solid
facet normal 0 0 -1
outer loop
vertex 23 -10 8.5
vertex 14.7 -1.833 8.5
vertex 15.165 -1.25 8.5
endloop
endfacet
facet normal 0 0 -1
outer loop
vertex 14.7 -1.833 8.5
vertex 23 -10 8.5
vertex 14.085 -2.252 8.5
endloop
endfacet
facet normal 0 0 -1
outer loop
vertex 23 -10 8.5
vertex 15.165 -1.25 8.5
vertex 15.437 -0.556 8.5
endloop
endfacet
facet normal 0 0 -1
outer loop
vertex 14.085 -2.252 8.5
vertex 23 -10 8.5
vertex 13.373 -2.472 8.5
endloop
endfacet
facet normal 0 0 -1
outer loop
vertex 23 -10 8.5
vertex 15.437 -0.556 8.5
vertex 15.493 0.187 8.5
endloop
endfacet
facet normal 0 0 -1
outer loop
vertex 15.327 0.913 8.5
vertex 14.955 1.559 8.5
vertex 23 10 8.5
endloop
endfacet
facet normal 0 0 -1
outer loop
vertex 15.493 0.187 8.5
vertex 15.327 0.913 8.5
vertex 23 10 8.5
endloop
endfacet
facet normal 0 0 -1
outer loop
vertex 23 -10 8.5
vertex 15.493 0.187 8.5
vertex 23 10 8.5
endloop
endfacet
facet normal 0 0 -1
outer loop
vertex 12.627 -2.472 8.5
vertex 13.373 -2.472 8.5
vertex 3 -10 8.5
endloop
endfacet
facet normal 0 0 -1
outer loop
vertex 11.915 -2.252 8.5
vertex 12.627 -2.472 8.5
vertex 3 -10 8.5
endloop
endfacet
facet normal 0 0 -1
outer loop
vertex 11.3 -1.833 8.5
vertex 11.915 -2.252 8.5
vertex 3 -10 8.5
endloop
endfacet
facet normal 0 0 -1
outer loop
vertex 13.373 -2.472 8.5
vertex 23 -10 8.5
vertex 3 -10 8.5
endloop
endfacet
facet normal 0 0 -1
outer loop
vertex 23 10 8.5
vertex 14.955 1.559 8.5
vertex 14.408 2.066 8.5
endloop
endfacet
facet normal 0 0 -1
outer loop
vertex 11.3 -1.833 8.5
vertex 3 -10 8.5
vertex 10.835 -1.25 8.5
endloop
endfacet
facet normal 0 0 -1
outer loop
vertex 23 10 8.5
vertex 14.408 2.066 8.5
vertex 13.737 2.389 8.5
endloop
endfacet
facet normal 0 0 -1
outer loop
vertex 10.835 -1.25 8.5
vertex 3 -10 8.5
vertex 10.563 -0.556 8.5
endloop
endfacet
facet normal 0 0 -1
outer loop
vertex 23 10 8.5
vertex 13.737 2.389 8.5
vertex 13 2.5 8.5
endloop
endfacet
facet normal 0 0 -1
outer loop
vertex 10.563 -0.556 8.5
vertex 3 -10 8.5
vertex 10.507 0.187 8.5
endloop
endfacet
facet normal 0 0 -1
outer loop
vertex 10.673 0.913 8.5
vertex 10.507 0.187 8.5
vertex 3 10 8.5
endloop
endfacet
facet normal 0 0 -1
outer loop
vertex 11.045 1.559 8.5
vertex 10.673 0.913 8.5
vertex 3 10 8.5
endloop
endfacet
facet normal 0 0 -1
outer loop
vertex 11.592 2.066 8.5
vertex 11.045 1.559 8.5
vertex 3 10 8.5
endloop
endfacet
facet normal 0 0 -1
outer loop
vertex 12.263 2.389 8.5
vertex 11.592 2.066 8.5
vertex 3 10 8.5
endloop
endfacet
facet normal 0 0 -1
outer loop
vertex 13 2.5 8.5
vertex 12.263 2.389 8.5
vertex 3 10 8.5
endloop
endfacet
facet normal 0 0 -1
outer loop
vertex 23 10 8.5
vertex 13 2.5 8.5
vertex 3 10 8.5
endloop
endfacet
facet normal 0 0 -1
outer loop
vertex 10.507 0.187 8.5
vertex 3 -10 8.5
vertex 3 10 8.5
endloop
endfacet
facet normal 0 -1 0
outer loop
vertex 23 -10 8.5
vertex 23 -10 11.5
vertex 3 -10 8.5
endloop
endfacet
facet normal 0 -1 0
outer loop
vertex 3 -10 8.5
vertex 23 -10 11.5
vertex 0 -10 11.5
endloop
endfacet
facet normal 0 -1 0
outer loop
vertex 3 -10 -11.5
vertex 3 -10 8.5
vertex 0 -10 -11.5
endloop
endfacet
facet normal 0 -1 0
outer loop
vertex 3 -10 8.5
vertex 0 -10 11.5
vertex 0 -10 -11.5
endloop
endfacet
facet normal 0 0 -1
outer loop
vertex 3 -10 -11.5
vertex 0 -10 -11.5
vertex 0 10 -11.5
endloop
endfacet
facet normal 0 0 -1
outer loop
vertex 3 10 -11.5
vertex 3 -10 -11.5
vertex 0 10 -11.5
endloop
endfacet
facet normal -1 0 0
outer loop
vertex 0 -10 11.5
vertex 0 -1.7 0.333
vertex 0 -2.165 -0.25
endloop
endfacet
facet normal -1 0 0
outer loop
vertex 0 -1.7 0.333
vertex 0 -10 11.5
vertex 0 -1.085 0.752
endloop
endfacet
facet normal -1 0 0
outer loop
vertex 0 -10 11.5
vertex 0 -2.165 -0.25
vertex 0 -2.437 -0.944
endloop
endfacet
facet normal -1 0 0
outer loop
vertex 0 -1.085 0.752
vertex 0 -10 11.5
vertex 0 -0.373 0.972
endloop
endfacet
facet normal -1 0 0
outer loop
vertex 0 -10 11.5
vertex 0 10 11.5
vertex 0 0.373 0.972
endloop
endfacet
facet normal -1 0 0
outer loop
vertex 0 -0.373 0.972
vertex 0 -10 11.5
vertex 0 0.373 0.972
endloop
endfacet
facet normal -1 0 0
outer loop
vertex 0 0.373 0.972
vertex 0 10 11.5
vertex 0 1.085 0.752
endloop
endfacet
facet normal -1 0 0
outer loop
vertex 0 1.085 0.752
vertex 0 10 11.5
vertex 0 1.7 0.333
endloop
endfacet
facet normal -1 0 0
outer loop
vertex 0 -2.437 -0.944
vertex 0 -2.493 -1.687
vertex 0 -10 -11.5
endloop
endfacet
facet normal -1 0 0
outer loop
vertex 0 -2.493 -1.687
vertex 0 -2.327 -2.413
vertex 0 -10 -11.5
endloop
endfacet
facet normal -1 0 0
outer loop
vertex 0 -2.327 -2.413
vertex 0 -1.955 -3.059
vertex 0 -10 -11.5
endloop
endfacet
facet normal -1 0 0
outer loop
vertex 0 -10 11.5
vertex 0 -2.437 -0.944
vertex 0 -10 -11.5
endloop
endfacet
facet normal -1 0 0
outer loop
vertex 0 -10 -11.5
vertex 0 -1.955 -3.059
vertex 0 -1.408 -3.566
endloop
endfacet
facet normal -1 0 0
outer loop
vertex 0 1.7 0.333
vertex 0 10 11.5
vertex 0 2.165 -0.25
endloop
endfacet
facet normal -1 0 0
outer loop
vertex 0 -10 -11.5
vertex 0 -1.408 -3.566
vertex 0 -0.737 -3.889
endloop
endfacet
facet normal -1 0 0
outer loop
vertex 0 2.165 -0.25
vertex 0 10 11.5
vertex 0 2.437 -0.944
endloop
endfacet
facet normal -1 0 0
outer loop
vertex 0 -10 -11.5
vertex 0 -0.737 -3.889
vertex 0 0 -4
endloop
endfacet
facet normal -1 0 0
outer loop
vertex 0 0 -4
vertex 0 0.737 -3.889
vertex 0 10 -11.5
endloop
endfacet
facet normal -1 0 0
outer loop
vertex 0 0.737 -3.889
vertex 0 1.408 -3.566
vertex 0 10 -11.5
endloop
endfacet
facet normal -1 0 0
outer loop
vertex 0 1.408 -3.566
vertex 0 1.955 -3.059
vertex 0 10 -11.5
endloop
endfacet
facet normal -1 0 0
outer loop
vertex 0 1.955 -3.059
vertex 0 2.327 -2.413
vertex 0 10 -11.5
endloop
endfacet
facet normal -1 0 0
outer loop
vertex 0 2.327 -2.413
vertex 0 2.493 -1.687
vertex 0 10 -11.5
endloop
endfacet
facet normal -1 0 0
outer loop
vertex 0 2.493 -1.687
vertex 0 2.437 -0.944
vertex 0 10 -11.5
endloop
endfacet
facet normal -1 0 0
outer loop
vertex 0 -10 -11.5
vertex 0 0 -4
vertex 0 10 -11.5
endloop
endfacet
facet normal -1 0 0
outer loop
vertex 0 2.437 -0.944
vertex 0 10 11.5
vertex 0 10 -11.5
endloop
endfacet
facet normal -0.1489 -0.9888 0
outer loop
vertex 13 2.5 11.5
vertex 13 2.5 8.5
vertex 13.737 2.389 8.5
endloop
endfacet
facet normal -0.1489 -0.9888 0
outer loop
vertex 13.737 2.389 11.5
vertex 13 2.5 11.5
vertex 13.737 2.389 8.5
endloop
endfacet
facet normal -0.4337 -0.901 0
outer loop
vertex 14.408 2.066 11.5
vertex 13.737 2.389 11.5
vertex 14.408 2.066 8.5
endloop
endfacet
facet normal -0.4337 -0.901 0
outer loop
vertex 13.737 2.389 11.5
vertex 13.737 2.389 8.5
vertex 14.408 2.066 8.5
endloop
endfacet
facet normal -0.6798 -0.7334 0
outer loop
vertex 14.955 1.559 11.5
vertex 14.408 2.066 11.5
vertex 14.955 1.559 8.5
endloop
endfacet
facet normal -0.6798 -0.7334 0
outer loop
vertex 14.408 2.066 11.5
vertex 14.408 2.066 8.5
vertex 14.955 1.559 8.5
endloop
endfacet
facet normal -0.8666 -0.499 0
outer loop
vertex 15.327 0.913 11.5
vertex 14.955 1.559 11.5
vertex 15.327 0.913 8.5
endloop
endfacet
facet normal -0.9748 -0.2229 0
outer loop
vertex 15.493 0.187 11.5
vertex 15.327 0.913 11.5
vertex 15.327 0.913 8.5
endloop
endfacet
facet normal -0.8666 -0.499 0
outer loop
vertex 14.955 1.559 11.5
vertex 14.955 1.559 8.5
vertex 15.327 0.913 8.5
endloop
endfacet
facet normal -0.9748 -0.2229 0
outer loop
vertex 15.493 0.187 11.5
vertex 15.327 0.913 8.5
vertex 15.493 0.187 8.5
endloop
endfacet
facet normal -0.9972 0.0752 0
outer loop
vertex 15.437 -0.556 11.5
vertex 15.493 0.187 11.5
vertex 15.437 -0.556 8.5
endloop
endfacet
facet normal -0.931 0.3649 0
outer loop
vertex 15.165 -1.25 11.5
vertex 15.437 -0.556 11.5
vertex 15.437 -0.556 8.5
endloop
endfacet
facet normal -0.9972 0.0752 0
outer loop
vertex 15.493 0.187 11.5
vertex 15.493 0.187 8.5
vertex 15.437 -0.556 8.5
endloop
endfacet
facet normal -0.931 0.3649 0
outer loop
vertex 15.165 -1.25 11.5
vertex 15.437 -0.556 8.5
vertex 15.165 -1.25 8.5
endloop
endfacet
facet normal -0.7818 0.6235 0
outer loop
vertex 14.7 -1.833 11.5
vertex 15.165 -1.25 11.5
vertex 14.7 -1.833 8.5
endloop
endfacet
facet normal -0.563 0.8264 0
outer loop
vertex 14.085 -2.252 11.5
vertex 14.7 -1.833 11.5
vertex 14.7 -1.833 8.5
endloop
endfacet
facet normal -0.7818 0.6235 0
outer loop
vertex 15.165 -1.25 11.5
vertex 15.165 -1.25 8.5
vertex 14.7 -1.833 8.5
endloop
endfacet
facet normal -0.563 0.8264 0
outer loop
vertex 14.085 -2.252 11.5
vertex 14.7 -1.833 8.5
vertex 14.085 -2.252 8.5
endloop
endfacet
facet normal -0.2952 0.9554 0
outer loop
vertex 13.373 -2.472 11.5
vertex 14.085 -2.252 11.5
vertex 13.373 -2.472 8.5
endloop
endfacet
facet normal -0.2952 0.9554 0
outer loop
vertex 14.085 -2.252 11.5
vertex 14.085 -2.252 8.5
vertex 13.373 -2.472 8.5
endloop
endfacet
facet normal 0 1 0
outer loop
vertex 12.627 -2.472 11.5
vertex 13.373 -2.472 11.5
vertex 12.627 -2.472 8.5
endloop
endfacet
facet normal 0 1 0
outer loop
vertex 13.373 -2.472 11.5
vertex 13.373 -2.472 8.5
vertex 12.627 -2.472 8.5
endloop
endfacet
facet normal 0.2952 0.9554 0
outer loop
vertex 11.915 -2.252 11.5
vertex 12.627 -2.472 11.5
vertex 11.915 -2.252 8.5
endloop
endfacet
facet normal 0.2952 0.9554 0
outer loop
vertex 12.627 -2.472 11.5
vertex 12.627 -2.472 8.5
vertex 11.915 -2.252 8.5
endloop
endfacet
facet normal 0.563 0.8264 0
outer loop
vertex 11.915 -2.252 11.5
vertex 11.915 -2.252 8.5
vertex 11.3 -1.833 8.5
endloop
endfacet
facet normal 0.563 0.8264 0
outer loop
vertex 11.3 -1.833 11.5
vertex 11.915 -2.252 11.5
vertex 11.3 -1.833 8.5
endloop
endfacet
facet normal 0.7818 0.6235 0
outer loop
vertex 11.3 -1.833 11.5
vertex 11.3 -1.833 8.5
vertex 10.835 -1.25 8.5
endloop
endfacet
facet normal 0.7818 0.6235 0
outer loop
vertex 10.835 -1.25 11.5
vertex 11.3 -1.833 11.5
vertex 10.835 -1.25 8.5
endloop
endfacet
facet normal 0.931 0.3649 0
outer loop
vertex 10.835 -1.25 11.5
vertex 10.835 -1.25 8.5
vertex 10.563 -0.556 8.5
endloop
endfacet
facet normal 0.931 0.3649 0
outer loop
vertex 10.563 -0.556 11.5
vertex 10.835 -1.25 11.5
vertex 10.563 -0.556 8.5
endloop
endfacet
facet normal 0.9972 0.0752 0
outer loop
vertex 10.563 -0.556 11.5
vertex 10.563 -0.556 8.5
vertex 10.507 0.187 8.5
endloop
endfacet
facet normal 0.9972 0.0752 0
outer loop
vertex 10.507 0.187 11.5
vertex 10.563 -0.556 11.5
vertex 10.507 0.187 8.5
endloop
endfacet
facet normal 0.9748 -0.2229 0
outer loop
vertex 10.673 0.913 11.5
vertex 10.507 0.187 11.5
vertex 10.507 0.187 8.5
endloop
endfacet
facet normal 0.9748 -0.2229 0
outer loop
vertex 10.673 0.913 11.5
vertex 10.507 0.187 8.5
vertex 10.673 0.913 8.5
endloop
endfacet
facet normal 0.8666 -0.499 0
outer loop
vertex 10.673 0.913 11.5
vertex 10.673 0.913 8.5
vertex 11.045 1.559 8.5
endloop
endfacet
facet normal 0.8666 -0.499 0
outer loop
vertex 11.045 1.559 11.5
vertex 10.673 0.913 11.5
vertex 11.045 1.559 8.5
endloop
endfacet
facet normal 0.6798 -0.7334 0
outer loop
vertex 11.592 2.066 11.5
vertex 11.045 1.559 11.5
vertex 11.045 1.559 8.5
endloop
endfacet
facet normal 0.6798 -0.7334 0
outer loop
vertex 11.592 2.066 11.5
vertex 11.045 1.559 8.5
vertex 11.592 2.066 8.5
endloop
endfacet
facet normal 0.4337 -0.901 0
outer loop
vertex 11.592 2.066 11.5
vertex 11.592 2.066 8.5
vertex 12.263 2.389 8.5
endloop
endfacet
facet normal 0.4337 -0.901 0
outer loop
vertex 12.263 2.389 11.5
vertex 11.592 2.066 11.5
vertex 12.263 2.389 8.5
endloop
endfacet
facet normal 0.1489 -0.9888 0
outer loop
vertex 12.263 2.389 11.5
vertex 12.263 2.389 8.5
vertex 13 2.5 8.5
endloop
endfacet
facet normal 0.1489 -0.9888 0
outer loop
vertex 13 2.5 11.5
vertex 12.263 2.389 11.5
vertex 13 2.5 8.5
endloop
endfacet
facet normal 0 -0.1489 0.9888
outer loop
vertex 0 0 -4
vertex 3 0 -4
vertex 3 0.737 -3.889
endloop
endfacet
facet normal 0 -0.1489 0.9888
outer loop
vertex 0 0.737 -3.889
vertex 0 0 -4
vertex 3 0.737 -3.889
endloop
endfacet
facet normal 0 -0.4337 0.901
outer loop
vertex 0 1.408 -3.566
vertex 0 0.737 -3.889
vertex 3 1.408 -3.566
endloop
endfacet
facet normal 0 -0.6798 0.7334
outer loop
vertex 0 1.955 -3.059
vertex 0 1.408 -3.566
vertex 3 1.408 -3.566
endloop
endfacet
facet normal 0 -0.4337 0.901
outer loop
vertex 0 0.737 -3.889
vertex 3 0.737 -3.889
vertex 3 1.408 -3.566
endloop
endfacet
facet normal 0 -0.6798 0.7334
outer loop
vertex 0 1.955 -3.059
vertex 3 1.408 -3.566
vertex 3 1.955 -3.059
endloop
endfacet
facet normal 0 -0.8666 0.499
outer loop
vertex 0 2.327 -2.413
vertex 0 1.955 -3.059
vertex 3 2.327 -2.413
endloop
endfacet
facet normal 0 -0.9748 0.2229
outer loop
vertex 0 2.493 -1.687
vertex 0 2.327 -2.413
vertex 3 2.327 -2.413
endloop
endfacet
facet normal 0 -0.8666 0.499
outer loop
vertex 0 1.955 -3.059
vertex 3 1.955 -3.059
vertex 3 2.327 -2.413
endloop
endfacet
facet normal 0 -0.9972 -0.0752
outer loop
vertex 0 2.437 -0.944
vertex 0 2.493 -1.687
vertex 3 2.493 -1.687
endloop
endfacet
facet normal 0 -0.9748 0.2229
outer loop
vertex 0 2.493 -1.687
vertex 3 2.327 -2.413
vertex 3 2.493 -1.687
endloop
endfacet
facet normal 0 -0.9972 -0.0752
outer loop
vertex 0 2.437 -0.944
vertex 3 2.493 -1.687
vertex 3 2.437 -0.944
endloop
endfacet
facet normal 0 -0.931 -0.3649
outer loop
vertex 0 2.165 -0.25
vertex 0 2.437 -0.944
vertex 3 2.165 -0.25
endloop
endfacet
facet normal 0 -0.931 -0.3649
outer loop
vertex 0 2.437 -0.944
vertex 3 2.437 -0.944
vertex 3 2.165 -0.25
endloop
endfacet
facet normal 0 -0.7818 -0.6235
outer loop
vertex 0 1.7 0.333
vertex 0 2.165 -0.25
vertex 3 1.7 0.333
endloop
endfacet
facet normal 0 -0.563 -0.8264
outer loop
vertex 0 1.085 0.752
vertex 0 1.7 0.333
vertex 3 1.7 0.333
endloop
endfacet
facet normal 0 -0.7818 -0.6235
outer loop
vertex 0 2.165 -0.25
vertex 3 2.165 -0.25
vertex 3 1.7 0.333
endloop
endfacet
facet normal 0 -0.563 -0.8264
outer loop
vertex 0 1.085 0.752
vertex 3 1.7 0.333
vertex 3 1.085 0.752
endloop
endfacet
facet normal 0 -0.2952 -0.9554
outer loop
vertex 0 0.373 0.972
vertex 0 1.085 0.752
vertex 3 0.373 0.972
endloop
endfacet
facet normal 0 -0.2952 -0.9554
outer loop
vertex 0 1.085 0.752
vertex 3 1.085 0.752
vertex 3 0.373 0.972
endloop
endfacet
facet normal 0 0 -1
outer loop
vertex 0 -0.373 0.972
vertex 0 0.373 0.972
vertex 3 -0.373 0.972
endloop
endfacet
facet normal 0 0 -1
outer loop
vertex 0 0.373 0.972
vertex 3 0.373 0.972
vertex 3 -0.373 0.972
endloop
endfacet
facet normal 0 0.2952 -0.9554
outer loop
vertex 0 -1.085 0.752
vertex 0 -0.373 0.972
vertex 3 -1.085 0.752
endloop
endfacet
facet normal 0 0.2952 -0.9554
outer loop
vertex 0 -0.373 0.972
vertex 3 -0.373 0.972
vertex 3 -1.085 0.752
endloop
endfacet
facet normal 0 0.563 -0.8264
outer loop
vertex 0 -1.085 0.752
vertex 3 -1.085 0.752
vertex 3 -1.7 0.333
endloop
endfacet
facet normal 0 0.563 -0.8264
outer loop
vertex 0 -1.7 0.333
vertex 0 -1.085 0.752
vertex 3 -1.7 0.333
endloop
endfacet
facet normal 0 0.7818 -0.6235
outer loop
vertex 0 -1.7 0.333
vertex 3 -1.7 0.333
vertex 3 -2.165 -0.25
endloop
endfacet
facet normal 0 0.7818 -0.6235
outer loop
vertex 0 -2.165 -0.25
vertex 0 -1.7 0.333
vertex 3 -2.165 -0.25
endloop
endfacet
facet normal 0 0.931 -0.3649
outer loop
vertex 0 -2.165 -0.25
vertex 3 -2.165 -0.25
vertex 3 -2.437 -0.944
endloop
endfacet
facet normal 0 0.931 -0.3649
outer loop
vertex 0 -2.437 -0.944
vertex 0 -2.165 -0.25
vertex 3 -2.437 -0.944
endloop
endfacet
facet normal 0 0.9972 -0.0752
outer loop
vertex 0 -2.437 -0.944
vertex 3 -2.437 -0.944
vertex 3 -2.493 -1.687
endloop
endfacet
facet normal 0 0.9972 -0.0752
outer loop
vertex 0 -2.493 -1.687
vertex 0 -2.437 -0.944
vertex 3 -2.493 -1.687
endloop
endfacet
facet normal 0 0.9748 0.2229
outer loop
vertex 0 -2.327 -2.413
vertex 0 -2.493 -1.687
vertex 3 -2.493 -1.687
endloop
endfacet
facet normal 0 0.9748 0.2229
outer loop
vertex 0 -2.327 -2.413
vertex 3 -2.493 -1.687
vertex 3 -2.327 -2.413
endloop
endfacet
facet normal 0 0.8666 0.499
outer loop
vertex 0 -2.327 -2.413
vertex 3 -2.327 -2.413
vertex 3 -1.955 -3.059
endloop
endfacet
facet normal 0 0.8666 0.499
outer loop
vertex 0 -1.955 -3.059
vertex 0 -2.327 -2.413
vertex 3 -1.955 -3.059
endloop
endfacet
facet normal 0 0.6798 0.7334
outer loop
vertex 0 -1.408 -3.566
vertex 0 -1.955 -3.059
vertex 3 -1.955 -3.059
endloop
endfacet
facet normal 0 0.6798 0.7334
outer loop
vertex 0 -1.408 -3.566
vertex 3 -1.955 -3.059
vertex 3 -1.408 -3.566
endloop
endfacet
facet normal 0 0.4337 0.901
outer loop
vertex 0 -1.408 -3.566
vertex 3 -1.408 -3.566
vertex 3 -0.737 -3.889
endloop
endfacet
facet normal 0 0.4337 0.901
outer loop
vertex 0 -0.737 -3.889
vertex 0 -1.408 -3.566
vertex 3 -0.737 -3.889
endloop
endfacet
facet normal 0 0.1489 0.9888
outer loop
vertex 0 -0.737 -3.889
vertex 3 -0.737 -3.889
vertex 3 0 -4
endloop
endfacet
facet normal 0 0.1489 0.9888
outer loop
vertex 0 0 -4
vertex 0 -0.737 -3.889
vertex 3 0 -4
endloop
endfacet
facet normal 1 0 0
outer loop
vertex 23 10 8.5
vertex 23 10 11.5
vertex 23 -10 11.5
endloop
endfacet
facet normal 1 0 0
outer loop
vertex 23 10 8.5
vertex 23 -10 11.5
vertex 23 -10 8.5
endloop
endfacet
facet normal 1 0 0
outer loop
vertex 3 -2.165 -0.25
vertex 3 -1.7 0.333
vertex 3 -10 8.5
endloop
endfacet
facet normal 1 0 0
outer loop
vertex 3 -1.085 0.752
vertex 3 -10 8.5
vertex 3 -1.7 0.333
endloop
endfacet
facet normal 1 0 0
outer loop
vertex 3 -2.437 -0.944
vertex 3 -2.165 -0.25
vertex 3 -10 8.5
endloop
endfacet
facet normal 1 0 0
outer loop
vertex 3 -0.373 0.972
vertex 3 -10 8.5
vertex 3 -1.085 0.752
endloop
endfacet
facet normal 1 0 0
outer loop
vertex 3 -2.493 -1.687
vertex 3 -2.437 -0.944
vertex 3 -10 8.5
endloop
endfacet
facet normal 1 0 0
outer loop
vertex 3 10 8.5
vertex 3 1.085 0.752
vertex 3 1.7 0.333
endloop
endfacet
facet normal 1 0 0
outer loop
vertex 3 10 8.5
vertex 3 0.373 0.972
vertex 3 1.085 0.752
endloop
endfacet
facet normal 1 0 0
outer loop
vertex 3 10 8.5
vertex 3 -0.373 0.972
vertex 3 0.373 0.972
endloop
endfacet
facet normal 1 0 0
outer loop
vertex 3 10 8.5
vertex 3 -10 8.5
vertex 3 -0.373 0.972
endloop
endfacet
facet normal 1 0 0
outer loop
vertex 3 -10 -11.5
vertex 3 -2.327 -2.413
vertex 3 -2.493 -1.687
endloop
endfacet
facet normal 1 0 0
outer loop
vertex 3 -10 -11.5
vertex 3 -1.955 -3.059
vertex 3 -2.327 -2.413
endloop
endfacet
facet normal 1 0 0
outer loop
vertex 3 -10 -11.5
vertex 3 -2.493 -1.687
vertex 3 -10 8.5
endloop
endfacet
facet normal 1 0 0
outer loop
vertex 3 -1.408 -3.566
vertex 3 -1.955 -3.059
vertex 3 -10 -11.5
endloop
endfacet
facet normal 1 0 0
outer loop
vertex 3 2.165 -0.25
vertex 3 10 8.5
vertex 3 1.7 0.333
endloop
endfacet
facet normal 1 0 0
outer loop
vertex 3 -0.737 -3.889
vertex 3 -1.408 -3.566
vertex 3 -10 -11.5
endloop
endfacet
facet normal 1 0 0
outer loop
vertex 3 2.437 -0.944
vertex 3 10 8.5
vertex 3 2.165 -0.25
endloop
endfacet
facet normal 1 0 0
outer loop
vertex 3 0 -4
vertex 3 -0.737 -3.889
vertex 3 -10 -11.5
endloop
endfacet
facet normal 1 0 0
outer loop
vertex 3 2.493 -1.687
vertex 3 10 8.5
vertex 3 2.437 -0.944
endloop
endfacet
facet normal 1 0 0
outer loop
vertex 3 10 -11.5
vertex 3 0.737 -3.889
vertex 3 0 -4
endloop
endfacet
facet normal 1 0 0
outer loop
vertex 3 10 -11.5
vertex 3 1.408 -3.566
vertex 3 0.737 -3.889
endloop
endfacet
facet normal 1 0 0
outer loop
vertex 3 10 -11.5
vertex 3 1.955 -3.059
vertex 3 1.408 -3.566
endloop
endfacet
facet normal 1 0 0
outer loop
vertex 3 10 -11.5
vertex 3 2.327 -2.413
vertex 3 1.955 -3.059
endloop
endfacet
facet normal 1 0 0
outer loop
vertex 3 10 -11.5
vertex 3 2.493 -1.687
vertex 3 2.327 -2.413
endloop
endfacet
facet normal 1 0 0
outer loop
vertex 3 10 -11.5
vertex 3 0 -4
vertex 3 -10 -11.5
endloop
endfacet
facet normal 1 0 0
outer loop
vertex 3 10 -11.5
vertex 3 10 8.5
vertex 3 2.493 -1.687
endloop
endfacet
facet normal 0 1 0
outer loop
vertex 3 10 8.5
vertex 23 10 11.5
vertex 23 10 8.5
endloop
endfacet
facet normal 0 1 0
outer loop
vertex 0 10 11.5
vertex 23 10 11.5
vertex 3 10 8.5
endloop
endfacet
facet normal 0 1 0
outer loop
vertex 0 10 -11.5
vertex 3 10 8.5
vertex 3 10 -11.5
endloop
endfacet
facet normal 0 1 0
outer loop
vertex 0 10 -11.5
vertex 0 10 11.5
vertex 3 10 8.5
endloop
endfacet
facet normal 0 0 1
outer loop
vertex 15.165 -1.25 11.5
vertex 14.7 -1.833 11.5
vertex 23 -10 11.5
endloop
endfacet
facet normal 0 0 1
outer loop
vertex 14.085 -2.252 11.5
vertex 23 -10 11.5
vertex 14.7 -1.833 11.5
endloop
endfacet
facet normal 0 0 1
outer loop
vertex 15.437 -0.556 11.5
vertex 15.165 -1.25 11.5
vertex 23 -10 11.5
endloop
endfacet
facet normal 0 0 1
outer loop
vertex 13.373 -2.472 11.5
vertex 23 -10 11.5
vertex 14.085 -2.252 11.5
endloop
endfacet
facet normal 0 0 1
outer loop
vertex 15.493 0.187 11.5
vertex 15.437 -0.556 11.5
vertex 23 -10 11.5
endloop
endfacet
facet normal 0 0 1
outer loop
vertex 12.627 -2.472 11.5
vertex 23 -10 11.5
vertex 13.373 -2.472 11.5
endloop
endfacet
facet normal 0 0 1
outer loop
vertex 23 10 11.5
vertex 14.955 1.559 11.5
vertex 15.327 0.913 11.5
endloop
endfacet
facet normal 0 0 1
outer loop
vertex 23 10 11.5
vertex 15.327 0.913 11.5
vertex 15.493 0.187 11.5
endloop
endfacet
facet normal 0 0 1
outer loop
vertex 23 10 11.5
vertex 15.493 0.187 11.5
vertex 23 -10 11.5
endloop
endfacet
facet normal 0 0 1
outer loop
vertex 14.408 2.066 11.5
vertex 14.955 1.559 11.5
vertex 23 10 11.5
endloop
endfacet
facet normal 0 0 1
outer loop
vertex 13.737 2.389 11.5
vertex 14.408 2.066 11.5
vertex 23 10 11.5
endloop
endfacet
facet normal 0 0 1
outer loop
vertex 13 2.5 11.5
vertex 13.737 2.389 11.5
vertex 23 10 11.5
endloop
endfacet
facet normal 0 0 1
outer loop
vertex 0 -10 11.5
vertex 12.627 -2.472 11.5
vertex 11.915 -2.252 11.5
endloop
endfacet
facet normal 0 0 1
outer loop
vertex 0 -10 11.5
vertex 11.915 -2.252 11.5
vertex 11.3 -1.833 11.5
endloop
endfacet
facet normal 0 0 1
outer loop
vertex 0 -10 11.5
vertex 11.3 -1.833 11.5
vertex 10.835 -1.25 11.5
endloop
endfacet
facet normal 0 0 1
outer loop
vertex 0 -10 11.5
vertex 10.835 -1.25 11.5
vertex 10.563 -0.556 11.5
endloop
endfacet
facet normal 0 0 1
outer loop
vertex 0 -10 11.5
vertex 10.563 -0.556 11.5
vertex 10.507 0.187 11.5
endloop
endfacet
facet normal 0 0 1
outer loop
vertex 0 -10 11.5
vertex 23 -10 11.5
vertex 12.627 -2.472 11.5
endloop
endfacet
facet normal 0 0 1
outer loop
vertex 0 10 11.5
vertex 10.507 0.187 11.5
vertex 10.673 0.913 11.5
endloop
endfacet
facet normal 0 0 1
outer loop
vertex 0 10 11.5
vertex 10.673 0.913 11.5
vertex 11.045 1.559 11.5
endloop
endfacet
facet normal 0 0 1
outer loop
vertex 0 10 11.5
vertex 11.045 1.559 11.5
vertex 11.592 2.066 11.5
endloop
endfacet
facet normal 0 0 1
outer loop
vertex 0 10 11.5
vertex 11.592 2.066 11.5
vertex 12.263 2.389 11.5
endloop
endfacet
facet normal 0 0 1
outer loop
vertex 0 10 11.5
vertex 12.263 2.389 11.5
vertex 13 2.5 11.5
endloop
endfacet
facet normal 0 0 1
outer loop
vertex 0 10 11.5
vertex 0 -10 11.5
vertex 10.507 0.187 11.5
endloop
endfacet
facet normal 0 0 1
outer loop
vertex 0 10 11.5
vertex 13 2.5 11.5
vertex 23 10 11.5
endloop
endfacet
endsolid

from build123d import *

# Parameters (mm, degrees)
SKETCH1_W           = 23
SKETCH1_H           = 20
BOSS_EXTRUDE1_DEPTH = 3
SKETCH2_W           = 3
SKETCH2_H           = 20
BOSS_EXTRUDE2_DEPTH = 20
CUT_EXTRUDE1_REACH  = 27.145
SKETCH3_R           = 2.5
CUT_EXTRUDE2_REACH  = 34.078
SKETCH4_R           = 2.5


with BuildPart() as part:
    # Sketch1 → Boss-Extrude1 (new body)
    with BuildSketch(Plane(origin=(0, 0, 0), x_dir=(0, 0, -1), z_dir=(1, 0, 0))):
        Rectangle(SKETCH1_W, SKETCH1_H)
    extrude(amount=BOSS_EXTRUDE1_DEPTH)

    # Sketch2 → Boss-Extrude2 (add)
    with BuildSketch(Plane(origin=(3, 0, 0), x_dir=(0, 0, -1), z_dir=(1, 0, 0))):
        with Locations((-10, 0)):
            Rectangle(SKETCH2_W, SKETCH2_H)
    extrude(amount=BOSS_EXTRUDE2_DEPTH)

    # Sketch3 → Cut-Extrude1 (cut, up to next)
    with BuildSketch(Plane(origin=(3, 0, 0), x_dir=(0, 0, -1), z_dir=(1, 0, 0)), mode=Mode.PRIVATE) as cut_extrude1_sk1:
        with Locations((1.5, 0)):
            Circle(SKETCH3_R)
    cut_extrude1_tool1 = extrude(cut_extrude1_sk1.sketch, amount=-CUT_EXTRUDE1_REACH, mode=Mode.PRIVATE) & part.part
    add(cut_extrude1_tool1.solids().sort_by_distance((3, 0, -1.5))[0], mode=Mode.SUBTRACT)

    # Sketch4 → Cut-Extrude2 (cut, up to next)
    with BuildSketch(Plane(origin=(0, 0, 8.5), x_dir=(-1, 0, 0), z_dir=(0, 0, -1)), mode=Mode.PRIVATE) as cut_extrude2_sk1:
        with Locations(Location((-13, 0, 0), (0, 0, 90))):
            Circle(SKETCH4_R)
    cut_extrude2_tool1 = extrude(cut_extrude2_sk1.sketch, amount=-CUT_EXTRUDE2_REACH, mode=Mode.PRIVATE) & part.part
    add(cut_extrude2_tool1.solids().sort_by_distance((13, 0, 8.5))[0], mode=Mode.SUBTRACT)


solid = part.part
